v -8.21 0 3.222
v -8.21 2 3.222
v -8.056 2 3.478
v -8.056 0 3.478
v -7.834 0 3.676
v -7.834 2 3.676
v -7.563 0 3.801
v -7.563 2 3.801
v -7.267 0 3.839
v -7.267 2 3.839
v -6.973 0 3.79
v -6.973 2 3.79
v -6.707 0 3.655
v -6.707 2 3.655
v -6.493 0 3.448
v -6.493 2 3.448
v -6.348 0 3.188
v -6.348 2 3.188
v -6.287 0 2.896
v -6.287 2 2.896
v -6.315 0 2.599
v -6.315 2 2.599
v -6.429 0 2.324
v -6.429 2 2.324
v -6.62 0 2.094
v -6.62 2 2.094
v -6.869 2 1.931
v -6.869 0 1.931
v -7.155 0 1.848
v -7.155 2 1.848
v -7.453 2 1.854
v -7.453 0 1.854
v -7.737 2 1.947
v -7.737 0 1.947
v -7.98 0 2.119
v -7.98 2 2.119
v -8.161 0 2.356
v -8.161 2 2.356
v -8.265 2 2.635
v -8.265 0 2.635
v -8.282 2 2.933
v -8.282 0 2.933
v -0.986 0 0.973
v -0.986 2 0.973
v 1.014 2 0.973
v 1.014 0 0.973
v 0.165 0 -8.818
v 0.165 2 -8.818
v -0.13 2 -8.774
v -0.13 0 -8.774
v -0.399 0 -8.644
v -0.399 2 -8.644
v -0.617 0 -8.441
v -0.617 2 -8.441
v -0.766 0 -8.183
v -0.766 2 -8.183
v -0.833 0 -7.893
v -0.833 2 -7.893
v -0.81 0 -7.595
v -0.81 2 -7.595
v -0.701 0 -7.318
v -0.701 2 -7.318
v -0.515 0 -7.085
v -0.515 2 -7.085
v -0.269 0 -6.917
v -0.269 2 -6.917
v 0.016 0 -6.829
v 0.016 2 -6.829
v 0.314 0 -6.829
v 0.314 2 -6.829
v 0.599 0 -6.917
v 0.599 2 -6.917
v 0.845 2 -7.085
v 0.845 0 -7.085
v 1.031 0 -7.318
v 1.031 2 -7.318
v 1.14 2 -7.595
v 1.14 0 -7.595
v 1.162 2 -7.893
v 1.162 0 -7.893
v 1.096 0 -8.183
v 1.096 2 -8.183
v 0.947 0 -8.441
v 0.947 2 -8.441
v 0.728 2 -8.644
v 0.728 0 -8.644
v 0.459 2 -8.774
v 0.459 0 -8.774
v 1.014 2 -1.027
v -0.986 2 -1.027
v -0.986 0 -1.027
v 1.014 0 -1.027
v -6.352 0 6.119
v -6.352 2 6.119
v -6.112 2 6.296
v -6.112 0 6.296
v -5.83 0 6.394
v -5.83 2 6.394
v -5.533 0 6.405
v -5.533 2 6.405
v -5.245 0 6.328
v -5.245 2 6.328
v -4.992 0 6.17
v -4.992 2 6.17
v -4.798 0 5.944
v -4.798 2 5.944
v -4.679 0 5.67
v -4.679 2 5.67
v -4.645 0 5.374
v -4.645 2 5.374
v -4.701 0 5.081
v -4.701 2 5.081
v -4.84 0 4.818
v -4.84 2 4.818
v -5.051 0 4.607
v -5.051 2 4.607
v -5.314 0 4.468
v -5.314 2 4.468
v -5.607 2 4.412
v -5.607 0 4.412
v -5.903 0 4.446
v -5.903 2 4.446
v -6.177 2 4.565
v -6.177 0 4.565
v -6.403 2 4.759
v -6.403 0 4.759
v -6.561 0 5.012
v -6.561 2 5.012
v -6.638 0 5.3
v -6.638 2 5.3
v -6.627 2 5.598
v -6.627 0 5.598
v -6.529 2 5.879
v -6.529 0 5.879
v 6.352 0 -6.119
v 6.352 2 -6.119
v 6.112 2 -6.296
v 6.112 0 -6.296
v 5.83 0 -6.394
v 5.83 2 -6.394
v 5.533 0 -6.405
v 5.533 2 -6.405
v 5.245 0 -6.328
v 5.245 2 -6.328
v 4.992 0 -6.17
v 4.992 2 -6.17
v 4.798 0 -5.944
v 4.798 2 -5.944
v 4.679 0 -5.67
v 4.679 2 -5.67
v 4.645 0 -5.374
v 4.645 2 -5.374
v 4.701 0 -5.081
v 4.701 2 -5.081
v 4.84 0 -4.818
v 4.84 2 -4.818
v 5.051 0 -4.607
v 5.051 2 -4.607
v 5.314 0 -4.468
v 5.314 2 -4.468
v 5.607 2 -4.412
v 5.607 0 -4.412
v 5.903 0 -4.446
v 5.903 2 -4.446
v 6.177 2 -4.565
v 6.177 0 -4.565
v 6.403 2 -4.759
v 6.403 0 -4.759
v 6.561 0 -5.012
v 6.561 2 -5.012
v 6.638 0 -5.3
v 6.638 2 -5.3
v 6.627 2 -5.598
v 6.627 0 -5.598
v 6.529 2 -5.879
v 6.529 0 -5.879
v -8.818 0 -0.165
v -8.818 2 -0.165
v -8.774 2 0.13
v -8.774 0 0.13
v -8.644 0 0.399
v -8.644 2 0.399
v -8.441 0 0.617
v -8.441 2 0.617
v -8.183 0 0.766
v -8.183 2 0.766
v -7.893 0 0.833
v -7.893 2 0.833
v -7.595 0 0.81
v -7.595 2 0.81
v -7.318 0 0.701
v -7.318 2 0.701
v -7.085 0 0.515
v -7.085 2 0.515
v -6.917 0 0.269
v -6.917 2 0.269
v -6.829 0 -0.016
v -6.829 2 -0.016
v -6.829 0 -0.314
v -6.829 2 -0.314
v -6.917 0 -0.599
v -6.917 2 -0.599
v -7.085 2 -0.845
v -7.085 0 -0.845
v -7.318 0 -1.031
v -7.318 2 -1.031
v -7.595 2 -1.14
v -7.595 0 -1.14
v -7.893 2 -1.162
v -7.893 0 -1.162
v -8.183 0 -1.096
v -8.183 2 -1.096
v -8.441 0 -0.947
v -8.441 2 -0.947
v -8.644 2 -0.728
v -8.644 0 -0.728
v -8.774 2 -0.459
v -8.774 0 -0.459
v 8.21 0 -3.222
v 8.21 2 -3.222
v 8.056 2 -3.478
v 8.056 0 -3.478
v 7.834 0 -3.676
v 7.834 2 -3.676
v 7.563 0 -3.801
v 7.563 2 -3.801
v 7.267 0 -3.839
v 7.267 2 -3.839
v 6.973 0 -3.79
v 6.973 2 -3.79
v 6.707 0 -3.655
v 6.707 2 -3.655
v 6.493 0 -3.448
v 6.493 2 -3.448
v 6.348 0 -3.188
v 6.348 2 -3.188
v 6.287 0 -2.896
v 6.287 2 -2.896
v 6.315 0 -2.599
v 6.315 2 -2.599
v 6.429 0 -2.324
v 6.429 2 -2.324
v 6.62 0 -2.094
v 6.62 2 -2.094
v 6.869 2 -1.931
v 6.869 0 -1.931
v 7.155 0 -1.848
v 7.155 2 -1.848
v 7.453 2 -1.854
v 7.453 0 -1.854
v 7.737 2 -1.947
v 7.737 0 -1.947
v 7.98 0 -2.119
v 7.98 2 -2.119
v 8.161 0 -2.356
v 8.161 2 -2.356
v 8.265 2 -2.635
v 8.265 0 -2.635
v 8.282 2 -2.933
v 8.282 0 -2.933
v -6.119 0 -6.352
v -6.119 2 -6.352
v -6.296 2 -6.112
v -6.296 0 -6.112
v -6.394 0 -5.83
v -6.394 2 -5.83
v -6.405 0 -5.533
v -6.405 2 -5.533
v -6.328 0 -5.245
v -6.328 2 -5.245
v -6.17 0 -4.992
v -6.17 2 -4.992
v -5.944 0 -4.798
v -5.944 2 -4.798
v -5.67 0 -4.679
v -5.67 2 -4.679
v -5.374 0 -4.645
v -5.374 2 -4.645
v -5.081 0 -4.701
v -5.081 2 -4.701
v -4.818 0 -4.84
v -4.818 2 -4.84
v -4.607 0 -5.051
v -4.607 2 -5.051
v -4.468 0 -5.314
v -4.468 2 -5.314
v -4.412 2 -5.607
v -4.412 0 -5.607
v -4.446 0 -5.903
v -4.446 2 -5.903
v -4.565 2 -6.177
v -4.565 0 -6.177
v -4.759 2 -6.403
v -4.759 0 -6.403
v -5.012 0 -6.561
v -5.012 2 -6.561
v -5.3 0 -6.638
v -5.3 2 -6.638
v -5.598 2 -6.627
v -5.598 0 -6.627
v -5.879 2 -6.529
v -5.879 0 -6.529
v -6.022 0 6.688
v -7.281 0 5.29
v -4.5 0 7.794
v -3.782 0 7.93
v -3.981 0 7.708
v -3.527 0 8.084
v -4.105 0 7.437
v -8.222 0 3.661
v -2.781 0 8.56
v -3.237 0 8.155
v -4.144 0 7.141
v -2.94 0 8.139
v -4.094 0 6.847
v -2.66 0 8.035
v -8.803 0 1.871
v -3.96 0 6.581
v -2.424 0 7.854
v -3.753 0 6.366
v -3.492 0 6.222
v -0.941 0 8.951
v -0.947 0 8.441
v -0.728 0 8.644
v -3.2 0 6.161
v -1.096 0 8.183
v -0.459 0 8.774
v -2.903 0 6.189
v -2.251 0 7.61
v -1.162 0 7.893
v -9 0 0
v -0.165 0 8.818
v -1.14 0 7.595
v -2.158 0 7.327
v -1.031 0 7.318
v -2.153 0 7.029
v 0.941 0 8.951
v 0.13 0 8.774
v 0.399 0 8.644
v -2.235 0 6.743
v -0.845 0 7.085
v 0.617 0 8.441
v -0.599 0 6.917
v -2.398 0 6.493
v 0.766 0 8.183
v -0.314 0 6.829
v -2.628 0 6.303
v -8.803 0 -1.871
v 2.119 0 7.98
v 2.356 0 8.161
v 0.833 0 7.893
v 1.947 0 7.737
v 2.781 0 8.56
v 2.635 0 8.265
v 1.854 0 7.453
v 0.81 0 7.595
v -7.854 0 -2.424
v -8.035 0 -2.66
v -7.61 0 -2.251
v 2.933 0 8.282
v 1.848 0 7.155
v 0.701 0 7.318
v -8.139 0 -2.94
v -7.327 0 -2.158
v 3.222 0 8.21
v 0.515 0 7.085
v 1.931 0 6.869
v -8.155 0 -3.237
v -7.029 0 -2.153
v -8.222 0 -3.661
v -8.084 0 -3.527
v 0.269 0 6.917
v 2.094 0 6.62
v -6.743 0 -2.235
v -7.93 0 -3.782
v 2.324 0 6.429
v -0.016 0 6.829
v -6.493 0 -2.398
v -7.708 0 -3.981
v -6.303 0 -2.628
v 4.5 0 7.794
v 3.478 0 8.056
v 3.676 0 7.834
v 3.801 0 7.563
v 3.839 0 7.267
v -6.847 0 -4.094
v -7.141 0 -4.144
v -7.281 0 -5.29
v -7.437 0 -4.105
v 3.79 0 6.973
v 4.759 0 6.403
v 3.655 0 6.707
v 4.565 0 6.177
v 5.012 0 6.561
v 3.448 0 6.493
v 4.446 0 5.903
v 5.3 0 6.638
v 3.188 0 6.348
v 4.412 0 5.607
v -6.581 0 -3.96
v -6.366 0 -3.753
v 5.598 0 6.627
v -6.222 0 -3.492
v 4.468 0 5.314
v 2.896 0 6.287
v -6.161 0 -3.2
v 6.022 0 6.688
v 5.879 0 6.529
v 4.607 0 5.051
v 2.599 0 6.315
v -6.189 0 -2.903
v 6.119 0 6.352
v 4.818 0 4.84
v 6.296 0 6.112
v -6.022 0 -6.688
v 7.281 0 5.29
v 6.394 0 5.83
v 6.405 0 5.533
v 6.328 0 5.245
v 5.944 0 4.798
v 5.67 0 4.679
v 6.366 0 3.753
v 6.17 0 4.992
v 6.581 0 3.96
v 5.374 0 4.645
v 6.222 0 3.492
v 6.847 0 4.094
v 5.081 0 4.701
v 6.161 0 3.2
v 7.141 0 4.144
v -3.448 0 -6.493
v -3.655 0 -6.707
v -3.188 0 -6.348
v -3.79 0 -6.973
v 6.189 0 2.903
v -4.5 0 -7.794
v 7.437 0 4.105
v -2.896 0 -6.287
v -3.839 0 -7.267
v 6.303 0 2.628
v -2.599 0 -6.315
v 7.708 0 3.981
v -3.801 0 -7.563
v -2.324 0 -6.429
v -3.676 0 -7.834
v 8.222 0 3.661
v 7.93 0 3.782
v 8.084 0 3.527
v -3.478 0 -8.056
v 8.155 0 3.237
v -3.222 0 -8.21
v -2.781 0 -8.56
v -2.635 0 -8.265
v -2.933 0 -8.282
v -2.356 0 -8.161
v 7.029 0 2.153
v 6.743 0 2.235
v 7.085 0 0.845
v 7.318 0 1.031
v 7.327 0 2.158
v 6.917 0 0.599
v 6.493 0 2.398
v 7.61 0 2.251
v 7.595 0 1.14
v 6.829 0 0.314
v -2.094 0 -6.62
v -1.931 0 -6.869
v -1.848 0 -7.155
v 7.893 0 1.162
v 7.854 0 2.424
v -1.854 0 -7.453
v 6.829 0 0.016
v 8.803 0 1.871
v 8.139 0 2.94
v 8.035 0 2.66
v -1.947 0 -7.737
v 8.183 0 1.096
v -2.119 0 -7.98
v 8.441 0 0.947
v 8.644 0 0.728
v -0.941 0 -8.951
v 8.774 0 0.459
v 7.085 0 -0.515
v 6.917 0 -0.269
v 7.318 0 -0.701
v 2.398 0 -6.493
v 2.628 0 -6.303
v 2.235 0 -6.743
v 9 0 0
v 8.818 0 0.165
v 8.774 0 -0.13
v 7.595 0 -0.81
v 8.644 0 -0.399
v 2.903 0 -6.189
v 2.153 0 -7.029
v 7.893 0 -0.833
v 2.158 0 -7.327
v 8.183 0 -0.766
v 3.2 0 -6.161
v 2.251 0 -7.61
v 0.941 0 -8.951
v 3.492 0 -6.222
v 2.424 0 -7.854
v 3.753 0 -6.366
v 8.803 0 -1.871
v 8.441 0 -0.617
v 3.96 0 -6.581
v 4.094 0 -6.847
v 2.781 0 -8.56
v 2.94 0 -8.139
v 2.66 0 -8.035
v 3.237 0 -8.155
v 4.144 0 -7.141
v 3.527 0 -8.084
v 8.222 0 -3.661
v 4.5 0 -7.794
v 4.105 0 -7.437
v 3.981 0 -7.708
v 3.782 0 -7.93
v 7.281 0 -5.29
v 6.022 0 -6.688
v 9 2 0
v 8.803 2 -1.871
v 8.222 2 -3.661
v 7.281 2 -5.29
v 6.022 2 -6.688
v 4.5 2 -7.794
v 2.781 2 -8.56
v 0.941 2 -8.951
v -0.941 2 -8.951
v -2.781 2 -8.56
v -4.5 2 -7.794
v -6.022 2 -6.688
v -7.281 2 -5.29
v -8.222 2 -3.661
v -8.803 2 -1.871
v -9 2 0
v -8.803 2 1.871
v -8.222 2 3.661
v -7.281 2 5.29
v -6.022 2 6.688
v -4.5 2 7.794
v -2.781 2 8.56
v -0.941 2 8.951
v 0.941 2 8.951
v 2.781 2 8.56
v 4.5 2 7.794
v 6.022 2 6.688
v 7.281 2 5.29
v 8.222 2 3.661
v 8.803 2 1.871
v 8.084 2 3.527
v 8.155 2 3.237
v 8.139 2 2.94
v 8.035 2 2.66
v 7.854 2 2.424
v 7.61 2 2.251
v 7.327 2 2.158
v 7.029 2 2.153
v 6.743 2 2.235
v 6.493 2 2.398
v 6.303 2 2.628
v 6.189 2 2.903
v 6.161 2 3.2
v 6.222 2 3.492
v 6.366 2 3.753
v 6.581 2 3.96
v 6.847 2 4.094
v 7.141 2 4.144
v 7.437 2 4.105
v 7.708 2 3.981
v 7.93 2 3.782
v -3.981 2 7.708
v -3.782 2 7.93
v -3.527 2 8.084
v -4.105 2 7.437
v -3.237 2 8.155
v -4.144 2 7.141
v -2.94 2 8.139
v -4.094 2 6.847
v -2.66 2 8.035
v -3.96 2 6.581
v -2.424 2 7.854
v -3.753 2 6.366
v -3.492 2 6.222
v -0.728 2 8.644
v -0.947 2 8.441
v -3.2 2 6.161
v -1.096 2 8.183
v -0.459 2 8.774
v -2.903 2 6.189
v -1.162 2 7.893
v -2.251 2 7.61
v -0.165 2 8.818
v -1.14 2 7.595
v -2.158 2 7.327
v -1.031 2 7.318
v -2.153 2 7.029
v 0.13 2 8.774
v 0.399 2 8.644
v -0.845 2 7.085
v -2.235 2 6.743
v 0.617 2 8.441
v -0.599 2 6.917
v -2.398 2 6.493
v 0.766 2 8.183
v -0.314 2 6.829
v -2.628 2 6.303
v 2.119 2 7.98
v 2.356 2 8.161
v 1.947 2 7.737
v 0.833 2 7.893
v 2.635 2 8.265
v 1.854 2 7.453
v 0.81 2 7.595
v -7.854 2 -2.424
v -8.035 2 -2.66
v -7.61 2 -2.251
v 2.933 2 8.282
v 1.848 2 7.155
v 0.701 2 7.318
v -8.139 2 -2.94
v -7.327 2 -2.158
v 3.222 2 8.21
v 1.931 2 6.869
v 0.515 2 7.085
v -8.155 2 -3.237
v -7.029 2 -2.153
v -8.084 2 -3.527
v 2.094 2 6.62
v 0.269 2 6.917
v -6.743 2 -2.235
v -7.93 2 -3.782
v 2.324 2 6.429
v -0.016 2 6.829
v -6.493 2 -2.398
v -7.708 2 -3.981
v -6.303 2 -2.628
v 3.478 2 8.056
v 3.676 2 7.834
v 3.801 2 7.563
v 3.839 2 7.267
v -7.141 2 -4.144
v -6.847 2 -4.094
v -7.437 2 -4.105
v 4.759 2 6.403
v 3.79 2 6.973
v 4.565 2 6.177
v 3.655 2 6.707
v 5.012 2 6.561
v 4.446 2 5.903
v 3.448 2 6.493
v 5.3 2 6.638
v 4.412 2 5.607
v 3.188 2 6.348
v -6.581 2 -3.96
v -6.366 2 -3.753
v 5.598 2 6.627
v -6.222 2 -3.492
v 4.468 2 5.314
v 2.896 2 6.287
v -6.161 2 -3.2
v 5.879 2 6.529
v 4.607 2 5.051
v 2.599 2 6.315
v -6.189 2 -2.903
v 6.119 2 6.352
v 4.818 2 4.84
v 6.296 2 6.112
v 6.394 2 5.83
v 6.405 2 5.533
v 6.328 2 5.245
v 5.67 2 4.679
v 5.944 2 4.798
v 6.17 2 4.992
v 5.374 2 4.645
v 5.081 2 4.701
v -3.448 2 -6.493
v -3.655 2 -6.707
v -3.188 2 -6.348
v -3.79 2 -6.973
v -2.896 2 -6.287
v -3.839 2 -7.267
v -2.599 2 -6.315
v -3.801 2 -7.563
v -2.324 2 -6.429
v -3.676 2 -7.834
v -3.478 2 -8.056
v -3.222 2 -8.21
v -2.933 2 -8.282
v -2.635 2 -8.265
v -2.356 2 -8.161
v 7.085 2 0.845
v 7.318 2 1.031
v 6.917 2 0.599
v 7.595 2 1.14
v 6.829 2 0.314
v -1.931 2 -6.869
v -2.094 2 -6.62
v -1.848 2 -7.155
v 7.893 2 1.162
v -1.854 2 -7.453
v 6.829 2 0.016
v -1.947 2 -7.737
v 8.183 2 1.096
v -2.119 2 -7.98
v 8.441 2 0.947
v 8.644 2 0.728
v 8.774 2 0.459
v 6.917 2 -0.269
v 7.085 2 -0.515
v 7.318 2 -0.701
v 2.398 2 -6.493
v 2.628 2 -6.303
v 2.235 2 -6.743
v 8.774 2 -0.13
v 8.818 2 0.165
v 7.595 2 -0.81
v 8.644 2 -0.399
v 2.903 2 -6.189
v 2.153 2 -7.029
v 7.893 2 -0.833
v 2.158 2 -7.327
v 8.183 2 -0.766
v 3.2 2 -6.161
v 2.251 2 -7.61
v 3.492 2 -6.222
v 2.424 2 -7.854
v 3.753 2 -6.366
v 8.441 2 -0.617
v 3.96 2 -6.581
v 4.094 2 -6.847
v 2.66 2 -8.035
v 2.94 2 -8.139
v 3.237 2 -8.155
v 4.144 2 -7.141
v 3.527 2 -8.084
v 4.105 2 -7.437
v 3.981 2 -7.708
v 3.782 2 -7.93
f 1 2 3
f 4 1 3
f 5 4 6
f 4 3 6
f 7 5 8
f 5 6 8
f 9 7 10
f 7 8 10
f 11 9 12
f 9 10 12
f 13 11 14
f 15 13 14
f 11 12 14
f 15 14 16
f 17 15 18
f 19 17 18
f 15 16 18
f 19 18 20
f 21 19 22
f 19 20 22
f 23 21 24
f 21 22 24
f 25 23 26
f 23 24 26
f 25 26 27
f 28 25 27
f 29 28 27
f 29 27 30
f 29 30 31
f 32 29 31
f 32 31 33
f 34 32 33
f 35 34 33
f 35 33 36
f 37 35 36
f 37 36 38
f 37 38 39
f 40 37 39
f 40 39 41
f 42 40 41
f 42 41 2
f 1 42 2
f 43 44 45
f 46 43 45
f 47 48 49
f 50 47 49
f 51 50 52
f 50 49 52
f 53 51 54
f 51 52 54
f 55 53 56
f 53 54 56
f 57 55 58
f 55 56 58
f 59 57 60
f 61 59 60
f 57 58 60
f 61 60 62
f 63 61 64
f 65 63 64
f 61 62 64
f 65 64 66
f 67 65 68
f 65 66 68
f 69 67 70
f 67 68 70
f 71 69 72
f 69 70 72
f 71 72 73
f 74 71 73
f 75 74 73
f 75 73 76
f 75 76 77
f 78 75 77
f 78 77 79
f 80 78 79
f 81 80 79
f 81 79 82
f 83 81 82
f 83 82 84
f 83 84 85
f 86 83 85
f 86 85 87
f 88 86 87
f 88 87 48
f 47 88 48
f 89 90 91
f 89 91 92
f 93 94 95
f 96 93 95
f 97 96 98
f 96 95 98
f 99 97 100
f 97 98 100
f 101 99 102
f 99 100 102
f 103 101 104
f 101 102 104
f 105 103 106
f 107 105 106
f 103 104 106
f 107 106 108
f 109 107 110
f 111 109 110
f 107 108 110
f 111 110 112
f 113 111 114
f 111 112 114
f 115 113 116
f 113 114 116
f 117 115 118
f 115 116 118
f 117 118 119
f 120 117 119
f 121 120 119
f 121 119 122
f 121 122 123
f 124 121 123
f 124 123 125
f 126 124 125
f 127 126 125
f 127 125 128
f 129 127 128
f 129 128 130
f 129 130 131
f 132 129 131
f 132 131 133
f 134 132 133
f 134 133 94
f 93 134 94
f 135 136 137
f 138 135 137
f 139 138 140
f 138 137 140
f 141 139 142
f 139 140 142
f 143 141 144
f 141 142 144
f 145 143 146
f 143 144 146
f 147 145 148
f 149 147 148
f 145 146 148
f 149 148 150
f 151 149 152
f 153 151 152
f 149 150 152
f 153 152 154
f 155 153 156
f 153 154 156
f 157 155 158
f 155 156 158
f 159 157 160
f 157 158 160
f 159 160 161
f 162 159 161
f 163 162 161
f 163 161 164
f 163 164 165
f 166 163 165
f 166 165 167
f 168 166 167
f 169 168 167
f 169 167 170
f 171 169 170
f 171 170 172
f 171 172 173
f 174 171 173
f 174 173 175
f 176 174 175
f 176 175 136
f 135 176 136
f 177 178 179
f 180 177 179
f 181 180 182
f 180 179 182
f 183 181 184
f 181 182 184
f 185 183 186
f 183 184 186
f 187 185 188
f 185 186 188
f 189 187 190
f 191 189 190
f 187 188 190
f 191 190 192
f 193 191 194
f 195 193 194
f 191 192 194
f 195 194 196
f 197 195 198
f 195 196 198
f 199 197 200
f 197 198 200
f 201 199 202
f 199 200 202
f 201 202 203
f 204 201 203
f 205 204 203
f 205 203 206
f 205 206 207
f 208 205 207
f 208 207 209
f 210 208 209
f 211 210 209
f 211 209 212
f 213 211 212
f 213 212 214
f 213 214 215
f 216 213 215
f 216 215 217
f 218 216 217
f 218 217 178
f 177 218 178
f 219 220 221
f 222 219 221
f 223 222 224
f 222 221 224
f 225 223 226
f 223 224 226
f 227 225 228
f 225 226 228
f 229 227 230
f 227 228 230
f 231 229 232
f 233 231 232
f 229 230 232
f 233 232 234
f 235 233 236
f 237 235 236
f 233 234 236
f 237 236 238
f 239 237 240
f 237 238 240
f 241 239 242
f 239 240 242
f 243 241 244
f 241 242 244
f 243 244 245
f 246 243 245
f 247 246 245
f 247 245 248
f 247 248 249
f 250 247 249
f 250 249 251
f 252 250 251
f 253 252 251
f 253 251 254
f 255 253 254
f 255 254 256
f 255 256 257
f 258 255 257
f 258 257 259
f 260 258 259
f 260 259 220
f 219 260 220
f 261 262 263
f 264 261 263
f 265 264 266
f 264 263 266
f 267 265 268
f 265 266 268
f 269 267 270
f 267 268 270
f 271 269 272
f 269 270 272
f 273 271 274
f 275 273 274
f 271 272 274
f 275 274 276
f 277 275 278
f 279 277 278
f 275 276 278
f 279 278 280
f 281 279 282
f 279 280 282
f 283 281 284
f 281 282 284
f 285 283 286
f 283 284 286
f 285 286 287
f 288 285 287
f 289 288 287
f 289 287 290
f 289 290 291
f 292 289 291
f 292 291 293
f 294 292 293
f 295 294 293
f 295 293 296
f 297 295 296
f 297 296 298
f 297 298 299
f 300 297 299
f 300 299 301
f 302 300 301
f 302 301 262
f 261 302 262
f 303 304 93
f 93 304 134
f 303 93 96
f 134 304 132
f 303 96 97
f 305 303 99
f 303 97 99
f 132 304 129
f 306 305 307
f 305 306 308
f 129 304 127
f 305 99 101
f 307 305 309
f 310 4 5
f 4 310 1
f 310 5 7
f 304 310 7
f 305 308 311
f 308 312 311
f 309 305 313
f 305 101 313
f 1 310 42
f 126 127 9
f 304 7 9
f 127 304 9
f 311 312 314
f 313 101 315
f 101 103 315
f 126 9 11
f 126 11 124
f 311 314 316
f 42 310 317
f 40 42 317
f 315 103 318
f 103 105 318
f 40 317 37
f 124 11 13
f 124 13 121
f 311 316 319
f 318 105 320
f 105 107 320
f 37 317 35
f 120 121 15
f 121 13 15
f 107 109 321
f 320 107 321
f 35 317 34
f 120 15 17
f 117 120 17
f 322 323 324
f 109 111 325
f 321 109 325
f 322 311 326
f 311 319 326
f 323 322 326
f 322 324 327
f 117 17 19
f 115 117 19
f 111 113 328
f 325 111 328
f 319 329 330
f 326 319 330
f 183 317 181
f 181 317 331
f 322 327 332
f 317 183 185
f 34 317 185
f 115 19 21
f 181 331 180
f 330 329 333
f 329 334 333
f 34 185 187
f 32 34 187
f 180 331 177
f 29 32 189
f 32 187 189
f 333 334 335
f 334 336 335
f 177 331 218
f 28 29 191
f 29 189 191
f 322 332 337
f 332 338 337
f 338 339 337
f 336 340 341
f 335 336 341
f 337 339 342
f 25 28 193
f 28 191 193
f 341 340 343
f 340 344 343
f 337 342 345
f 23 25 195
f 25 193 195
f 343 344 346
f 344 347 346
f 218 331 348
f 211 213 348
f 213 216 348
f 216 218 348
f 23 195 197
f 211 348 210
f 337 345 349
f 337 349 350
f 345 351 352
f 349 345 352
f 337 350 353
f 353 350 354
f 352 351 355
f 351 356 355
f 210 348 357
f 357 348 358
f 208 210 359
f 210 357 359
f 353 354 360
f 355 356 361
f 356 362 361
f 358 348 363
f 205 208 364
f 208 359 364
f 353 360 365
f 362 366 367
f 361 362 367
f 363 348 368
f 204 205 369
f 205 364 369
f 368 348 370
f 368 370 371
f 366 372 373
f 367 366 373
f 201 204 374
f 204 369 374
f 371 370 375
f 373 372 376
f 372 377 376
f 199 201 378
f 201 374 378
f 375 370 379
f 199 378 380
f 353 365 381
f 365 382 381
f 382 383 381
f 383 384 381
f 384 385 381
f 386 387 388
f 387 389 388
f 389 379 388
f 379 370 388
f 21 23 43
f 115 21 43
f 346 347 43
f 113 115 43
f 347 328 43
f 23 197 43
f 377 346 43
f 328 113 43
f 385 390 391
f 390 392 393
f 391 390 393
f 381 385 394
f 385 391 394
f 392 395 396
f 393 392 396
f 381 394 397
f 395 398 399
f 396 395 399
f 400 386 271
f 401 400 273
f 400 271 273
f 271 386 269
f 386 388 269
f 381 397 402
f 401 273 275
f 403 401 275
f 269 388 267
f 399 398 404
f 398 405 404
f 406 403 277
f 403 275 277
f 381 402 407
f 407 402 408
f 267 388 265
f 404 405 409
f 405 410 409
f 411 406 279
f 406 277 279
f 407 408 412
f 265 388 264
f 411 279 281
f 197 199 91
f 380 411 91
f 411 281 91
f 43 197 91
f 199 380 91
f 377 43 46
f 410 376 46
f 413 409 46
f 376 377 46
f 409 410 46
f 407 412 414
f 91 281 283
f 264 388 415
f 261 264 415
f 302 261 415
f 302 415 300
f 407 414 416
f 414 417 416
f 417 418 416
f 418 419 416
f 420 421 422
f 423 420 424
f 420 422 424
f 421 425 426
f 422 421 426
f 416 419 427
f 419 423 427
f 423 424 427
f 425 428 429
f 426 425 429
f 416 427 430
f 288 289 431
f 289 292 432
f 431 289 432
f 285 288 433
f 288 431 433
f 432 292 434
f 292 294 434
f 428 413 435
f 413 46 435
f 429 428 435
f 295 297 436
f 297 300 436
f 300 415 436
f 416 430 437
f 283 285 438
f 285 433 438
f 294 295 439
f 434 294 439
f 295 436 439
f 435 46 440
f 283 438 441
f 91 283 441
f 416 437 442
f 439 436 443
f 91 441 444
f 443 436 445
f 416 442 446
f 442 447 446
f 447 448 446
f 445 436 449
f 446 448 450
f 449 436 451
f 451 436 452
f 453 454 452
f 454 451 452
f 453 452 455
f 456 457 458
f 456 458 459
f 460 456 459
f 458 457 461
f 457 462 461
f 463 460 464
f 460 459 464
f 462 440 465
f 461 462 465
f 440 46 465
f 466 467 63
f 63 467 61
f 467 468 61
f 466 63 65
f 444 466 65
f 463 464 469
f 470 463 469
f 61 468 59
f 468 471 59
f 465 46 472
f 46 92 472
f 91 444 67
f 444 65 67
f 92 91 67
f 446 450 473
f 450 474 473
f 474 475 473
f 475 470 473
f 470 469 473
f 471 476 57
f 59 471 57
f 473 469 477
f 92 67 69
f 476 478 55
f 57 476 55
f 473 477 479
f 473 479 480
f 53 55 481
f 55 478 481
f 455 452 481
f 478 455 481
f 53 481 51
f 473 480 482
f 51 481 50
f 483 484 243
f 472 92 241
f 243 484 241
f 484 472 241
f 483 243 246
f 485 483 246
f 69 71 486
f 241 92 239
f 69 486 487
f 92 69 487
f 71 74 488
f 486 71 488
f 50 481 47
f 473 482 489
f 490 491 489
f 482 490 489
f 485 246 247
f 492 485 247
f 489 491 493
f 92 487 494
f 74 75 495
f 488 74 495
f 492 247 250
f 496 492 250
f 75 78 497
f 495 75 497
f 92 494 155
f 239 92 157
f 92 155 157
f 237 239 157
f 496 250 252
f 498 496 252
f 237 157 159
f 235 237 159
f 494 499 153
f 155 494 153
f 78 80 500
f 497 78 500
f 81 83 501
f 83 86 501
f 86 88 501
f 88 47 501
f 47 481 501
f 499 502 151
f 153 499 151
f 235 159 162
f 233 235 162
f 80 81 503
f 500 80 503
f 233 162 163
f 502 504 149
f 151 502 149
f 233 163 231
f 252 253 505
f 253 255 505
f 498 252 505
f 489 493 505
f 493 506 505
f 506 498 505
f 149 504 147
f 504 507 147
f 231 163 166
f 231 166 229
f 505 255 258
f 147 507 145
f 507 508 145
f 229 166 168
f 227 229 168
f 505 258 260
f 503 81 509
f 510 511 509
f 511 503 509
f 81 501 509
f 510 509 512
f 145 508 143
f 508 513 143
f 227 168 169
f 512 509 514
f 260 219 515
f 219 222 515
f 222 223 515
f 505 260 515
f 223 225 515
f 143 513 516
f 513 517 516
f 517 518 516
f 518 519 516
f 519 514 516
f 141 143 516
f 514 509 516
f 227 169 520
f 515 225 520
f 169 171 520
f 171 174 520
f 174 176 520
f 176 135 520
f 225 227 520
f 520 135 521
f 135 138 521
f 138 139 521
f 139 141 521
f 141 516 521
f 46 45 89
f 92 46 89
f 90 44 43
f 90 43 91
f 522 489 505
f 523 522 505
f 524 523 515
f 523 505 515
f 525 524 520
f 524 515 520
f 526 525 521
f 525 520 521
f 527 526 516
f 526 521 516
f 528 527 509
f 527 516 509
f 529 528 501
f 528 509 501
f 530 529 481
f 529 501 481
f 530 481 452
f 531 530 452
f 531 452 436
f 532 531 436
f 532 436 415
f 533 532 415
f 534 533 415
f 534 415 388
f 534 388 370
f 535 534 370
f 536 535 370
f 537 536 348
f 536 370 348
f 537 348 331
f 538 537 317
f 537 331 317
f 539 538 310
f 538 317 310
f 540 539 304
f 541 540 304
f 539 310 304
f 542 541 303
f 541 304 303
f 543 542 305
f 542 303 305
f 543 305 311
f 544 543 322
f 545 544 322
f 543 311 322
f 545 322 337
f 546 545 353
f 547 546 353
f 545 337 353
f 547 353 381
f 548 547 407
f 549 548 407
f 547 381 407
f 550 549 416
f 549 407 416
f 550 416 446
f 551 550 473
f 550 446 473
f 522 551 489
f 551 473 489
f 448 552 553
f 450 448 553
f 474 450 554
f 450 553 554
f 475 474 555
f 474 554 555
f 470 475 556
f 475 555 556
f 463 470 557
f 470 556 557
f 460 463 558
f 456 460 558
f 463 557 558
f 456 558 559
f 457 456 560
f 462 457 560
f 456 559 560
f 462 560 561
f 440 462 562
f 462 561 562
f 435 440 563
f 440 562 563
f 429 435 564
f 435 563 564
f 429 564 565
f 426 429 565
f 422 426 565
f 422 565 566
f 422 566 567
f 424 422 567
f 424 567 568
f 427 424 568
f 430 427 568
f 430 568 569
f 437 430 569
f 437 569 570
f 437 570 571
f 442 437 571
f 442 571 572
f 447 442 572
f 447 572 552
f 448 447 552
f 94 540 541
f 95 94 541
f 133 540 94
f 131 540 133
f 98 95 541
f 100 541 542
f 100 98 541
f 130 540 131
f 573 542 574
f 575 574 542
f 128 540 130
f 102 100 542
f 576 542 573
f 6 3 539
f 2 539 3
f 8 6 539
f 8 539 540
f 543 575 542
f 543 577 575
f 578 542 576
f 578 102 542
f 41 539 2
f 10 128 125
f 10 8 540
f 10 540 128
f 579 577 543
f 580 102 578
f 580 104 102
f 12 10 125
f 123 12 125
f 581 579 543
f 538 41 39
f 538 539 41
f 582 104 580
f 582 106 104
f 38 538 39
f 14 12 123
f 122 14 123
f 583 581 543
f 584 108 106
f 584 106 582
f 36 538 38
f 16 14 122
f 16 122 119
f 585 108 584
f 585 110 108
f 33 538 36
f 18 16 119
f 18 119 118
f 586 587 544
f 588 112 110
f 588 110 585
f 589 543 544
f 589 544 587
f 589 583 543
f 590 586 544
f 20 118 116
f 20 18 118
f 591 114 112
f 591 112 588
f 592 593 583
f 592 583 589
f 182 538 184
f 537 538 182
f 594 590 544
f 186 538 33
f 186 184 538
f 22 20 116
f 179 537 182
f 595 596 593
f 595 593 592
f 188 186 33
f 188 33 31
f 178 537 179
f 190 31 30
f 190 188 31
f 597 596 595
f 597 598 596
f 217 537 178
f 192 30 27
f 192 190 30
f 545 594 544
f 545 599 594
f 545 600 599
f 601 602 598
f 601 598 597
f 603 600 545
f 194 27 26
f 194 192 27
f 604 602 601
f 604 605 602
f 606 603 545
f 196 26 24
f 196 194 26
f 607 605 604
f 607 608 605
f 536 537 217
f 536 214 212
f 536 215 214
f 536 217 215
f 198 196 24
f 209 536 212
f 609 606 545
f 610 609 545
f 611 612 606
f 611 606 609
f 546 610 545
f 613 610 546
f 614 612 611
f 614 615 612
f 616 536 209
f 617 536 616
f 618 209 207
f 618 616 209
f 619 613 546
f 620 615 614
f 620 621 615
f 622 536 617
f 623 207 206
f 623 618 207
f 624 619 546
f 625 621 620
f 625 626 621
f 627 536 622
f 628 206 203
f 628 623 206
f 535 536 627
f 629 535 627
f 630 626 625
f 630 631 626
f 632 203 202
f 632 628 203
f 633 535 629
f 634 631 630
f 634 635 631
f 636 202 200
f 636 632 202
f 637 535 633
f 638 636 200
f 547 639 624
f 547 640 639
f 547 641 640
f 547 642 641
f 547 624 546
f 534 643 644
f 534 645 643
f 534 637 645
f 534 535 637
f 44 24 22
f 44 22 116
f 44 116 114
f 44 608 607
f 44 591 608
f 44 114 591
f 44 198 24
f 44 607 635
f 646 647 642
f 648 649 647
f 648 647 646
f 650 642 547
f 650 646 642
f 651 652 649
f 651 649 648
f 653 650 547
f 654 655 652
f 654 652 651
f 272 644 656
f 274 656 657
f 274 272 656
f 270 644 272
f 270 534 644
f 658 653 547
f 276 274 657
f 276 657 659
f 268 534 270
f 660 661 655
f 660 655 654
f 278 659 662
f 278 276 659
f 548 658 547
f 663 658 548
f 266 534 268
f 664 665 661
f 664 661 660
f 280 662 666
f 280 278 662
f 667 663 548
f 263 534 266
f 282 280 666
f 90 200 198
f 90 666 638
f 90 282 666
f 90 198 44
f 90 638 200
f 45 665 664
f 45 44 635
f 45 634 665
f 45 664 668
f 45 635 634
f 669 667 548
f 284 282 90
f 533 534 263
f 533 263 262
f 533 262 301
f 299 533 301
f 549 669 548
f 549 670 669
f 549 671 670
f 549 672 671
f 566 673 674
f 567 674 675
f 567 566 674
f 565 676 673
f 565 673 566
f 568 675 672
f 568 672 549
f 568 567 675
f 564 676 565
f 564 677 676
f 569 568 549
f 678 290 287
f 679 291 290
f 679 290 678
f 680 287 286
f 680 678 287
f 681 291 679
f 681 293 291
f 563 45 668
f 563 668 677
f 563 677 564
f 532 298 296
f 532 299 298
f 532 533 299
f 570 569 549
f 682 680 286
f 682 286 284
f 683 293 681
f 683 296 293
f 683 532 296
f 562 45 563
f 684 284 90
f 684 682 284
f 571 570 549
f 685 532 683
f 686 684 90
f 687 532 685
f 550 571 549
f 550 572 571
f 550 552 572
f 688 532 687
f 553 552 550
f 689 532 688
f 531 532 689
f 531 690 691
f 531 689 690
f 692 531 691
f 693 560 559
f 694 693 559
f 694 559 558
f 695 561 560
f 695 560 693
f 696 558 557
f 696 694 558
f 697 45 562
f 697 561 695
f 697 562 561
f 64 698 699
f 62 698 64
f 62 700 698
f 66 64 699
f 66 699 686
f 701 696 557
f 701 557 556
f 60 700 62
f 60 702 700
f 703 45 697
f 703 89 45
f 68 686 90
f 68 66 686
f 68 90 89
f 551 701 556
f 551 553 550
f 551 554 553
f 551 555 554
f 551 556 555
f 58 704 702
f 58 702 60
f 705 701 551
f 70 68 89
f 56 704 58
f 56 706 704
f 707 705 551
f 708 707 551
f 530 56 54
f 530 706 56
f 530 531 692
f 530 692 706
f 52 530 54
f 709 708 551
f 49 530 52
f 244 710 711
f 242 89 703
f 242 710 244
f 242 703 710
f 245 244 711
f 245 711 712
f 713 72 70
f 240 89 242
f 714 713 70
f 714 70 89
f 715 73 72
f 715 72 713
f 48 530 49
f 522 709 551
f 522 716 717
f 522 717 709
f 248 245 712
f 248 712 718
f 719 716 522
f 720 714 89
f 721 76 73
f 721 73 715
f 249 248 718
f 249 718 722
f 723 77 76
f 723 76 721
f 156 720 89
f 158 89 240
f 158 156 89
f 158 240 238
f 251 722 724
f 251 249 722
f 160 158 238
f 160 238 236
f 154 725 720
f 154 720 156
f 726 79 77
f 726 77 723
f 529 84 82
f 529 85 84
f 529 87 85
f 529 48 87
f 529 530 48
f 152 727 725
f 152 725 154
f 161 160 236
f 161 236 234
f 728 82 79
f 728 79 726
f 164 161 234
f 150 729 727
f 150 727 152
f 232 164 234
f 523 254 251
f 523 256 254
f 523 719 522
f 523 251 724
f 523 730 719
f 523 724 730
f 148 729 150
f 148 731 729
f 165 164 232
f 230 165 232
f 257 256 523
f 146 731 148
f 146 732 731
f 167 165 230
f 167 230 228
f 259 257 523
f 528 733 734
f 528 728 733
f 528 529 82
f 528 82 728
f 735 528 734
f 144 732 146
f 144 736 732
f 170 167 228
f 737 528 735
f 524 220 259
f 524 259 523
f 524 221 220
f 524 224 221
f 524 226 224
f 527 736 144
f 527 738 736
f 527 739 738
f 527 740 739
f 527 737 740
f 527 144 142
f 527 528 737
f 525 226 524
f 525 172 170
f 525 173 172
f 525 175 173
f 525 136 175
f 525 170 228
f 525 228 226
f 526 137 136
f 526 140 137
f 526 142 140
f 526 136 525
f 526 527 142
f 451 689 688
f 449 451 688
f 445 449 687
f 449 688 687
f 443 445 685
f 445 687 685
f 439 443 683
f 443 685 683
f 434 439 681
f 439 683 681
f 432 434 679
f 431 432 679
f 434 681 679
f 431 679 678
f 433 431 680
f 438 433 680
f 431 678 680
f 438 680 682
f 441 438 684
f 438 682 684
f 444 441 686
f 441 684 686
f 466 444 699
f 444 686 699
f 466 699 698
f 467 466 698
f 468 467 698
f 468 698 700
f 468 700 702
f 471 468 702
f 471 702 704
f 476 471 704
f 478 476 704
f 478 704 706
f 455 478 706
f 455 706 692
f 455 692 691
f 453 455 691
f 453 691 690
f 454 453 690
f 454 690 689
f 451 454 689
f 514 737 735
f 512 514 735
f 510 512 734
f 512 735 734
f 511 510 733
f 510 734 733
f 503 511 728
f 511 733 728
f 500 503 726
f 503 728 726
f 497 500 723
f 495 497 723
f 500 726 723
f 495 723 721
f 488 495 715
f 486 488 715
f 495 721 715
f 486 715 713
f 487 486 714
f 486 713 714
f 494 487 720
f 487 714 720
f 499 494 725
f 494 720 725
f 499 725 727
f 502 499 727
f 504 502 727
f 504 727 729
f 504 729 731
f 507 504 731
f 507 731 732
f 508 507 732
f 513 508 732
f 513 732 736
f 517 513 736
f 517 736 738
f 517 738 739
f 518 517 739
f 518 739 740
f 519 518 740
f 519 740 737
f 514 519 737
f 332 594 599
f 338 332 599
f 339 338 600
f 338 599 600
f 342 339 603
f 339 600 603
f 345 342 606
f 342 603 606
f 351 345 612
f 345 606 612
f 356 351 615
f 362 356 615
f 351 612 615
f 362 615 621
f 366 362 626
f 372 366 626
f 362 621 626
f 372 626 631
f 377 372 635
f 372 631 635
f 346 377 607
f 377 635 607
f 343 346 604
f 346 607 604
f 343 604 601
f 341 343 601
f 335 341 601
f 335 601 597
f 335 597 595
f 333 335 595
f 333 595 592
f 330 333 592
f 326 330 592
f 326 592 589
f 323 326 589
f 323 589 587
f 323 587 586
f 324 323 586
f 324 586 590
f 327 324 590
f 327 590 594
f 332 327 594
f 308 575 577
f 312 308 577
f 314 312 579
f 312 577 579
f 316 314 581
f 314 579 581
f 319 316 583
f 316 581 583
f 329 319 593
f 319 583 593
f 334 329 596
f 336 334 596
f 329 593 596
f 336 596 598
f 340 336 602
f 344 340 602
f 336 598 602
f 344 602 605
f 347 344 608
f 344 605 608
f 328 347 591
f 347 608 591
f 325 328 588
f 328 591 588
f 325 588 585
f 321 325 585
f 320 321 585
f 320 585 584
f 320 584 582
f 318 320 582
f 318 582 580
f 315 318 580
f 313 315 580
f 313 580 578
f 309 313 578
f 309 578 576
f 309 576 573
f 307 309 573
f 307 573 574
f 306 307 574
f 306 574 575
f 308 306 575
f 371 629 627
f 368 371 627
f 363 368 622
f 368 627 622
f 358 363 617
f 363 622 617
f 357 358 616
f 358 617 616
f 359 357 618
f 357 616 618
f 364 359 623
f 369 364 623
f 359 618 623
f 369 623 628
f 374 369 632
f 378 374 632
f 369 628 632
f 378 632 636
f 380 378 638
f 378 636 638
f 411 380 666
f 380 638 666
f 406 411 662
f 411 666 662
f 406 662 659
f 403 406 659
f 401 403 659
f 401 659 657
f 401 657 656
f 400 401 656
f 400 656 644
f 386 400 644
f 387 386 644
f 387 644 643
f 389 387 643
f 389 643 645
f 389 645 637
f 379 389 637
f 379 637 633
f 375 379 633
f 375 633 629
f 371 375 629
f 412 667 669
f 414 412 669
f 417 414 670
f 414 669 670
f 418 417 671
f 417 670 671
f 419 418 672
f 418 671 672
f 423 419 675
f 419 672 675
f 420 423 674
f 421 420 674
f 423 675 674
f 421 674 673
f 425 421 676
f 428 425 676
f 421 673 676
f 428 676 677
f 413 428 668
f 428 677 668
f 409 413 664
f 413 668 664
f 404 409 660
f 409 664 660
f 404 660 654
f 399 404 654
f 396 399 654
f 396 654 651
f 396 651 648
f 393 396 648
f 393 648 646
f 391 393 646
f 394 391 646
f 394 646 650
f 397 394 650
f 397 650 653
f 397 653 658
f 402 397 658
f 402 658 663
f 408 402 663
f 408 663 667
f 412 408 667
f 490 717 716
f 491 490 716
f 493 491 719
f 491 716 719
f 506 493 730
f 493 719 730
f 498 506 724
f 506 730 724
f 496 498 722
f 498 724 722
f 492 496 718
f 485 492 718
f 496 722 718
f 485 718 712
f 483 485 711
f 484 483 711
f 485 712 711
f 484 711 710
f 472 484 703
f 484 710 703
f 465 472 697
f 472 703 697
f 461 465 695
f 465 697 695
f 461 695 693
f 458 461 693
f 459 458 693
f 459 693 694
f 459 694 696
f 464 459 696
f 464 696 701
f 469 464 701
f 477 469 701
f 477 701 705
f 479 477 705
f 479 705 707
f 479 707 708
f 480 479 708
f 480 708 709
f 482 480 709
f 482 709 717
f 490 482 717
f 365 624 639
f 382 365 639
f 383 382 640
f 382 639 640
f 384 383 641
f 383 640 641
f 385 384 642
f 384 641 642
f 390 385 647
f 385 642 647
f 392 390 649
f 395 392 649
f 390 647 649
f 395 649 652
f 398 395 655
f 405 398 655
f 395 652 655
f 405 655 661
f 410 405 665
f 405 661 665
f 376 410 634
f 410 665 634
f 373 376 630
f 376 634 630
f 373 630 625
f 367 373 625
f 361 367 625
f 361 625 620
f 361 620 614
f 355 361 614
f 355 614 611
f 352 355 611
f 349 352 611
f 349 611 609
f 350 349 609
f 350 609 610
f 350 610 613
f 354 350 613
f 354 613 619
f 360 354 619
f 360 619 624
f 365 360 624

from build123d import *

# Parameters (mm, degrees)
SKIZZE1_R                       = 9
AUFSATZ_LINEAR_AUSTRAGEN1_DEPTH = 2
SKIZZE3_W                       = 2
SKIZZE3_H                       = 2
SCHNITT_LINEAR_AUSTRAGEN1_DEPTH = 3
SKIZZE4_R                       = 1
SCHNITT_LINEAR_AUSTRAGEN2_DEPTH = 3
KREISMUSTER1_COUNT              = 16


with BuildPart() as part:
    # Skizze1 → Aufsatz-Linear austragen1 (new body)
    with BuildSketch(Plane(origin=(0, 0, 0), x_dir=(1, 0, 0), z_dir=(0, 1, 0))):
        Circle(SKIZZE1_R)
    extrude(amount=AUFSATZ_LINEAR_AUSTRAGEN1_DEPTH)

    # Skizze3 → Schnitt-Linear austragen1 (cut)
    with BuildSketch(Plane(origin=(0, 2, 0), x_dir=(1, 0, 0), z_dir=(0, 1, 0))):
        with Locations((0.014205659, 0.027357499)):
            Rectangle(SKIZZE3_W, SKIZZE3_H)
    extrude(amount=-SCHNITT_LINEAR_AUSTRAGEN1_DEPTH, mode=Mode.SUBTRACT)

    # Skizze4 → Schnitt-Linear austragen2 (cut)
    with BuildSketch(Plane(origin=(0, 2, 0), x_dir=(1, 0, 0), z_dir=(0, 1, 0))):
        with Locations((7.817951829, -0.164692324)):
            Circle(SKIZZE4_R)
    schnitt_linear_austragen2 = extrude(amount=-SCHNITT_LINEAR_AUSTRAGEN2_DEPTH, mode=Mode.SUBTRACT)

    # Kreismuster1: Schnitt-Linear austragen2 ×16 about axis
    kreismuster1_axis = Axis((0, 0, 0), (0, 1, 0))
    for i in range(1, KREISMUSTER1_COUNT):
        add(schnitt_linear_austragen2.rotate(kreismuster1_axis, i * 360 / KREISMUSTER1_COUNT), mode=Mode.SUBTRACT)


solid = part.part
